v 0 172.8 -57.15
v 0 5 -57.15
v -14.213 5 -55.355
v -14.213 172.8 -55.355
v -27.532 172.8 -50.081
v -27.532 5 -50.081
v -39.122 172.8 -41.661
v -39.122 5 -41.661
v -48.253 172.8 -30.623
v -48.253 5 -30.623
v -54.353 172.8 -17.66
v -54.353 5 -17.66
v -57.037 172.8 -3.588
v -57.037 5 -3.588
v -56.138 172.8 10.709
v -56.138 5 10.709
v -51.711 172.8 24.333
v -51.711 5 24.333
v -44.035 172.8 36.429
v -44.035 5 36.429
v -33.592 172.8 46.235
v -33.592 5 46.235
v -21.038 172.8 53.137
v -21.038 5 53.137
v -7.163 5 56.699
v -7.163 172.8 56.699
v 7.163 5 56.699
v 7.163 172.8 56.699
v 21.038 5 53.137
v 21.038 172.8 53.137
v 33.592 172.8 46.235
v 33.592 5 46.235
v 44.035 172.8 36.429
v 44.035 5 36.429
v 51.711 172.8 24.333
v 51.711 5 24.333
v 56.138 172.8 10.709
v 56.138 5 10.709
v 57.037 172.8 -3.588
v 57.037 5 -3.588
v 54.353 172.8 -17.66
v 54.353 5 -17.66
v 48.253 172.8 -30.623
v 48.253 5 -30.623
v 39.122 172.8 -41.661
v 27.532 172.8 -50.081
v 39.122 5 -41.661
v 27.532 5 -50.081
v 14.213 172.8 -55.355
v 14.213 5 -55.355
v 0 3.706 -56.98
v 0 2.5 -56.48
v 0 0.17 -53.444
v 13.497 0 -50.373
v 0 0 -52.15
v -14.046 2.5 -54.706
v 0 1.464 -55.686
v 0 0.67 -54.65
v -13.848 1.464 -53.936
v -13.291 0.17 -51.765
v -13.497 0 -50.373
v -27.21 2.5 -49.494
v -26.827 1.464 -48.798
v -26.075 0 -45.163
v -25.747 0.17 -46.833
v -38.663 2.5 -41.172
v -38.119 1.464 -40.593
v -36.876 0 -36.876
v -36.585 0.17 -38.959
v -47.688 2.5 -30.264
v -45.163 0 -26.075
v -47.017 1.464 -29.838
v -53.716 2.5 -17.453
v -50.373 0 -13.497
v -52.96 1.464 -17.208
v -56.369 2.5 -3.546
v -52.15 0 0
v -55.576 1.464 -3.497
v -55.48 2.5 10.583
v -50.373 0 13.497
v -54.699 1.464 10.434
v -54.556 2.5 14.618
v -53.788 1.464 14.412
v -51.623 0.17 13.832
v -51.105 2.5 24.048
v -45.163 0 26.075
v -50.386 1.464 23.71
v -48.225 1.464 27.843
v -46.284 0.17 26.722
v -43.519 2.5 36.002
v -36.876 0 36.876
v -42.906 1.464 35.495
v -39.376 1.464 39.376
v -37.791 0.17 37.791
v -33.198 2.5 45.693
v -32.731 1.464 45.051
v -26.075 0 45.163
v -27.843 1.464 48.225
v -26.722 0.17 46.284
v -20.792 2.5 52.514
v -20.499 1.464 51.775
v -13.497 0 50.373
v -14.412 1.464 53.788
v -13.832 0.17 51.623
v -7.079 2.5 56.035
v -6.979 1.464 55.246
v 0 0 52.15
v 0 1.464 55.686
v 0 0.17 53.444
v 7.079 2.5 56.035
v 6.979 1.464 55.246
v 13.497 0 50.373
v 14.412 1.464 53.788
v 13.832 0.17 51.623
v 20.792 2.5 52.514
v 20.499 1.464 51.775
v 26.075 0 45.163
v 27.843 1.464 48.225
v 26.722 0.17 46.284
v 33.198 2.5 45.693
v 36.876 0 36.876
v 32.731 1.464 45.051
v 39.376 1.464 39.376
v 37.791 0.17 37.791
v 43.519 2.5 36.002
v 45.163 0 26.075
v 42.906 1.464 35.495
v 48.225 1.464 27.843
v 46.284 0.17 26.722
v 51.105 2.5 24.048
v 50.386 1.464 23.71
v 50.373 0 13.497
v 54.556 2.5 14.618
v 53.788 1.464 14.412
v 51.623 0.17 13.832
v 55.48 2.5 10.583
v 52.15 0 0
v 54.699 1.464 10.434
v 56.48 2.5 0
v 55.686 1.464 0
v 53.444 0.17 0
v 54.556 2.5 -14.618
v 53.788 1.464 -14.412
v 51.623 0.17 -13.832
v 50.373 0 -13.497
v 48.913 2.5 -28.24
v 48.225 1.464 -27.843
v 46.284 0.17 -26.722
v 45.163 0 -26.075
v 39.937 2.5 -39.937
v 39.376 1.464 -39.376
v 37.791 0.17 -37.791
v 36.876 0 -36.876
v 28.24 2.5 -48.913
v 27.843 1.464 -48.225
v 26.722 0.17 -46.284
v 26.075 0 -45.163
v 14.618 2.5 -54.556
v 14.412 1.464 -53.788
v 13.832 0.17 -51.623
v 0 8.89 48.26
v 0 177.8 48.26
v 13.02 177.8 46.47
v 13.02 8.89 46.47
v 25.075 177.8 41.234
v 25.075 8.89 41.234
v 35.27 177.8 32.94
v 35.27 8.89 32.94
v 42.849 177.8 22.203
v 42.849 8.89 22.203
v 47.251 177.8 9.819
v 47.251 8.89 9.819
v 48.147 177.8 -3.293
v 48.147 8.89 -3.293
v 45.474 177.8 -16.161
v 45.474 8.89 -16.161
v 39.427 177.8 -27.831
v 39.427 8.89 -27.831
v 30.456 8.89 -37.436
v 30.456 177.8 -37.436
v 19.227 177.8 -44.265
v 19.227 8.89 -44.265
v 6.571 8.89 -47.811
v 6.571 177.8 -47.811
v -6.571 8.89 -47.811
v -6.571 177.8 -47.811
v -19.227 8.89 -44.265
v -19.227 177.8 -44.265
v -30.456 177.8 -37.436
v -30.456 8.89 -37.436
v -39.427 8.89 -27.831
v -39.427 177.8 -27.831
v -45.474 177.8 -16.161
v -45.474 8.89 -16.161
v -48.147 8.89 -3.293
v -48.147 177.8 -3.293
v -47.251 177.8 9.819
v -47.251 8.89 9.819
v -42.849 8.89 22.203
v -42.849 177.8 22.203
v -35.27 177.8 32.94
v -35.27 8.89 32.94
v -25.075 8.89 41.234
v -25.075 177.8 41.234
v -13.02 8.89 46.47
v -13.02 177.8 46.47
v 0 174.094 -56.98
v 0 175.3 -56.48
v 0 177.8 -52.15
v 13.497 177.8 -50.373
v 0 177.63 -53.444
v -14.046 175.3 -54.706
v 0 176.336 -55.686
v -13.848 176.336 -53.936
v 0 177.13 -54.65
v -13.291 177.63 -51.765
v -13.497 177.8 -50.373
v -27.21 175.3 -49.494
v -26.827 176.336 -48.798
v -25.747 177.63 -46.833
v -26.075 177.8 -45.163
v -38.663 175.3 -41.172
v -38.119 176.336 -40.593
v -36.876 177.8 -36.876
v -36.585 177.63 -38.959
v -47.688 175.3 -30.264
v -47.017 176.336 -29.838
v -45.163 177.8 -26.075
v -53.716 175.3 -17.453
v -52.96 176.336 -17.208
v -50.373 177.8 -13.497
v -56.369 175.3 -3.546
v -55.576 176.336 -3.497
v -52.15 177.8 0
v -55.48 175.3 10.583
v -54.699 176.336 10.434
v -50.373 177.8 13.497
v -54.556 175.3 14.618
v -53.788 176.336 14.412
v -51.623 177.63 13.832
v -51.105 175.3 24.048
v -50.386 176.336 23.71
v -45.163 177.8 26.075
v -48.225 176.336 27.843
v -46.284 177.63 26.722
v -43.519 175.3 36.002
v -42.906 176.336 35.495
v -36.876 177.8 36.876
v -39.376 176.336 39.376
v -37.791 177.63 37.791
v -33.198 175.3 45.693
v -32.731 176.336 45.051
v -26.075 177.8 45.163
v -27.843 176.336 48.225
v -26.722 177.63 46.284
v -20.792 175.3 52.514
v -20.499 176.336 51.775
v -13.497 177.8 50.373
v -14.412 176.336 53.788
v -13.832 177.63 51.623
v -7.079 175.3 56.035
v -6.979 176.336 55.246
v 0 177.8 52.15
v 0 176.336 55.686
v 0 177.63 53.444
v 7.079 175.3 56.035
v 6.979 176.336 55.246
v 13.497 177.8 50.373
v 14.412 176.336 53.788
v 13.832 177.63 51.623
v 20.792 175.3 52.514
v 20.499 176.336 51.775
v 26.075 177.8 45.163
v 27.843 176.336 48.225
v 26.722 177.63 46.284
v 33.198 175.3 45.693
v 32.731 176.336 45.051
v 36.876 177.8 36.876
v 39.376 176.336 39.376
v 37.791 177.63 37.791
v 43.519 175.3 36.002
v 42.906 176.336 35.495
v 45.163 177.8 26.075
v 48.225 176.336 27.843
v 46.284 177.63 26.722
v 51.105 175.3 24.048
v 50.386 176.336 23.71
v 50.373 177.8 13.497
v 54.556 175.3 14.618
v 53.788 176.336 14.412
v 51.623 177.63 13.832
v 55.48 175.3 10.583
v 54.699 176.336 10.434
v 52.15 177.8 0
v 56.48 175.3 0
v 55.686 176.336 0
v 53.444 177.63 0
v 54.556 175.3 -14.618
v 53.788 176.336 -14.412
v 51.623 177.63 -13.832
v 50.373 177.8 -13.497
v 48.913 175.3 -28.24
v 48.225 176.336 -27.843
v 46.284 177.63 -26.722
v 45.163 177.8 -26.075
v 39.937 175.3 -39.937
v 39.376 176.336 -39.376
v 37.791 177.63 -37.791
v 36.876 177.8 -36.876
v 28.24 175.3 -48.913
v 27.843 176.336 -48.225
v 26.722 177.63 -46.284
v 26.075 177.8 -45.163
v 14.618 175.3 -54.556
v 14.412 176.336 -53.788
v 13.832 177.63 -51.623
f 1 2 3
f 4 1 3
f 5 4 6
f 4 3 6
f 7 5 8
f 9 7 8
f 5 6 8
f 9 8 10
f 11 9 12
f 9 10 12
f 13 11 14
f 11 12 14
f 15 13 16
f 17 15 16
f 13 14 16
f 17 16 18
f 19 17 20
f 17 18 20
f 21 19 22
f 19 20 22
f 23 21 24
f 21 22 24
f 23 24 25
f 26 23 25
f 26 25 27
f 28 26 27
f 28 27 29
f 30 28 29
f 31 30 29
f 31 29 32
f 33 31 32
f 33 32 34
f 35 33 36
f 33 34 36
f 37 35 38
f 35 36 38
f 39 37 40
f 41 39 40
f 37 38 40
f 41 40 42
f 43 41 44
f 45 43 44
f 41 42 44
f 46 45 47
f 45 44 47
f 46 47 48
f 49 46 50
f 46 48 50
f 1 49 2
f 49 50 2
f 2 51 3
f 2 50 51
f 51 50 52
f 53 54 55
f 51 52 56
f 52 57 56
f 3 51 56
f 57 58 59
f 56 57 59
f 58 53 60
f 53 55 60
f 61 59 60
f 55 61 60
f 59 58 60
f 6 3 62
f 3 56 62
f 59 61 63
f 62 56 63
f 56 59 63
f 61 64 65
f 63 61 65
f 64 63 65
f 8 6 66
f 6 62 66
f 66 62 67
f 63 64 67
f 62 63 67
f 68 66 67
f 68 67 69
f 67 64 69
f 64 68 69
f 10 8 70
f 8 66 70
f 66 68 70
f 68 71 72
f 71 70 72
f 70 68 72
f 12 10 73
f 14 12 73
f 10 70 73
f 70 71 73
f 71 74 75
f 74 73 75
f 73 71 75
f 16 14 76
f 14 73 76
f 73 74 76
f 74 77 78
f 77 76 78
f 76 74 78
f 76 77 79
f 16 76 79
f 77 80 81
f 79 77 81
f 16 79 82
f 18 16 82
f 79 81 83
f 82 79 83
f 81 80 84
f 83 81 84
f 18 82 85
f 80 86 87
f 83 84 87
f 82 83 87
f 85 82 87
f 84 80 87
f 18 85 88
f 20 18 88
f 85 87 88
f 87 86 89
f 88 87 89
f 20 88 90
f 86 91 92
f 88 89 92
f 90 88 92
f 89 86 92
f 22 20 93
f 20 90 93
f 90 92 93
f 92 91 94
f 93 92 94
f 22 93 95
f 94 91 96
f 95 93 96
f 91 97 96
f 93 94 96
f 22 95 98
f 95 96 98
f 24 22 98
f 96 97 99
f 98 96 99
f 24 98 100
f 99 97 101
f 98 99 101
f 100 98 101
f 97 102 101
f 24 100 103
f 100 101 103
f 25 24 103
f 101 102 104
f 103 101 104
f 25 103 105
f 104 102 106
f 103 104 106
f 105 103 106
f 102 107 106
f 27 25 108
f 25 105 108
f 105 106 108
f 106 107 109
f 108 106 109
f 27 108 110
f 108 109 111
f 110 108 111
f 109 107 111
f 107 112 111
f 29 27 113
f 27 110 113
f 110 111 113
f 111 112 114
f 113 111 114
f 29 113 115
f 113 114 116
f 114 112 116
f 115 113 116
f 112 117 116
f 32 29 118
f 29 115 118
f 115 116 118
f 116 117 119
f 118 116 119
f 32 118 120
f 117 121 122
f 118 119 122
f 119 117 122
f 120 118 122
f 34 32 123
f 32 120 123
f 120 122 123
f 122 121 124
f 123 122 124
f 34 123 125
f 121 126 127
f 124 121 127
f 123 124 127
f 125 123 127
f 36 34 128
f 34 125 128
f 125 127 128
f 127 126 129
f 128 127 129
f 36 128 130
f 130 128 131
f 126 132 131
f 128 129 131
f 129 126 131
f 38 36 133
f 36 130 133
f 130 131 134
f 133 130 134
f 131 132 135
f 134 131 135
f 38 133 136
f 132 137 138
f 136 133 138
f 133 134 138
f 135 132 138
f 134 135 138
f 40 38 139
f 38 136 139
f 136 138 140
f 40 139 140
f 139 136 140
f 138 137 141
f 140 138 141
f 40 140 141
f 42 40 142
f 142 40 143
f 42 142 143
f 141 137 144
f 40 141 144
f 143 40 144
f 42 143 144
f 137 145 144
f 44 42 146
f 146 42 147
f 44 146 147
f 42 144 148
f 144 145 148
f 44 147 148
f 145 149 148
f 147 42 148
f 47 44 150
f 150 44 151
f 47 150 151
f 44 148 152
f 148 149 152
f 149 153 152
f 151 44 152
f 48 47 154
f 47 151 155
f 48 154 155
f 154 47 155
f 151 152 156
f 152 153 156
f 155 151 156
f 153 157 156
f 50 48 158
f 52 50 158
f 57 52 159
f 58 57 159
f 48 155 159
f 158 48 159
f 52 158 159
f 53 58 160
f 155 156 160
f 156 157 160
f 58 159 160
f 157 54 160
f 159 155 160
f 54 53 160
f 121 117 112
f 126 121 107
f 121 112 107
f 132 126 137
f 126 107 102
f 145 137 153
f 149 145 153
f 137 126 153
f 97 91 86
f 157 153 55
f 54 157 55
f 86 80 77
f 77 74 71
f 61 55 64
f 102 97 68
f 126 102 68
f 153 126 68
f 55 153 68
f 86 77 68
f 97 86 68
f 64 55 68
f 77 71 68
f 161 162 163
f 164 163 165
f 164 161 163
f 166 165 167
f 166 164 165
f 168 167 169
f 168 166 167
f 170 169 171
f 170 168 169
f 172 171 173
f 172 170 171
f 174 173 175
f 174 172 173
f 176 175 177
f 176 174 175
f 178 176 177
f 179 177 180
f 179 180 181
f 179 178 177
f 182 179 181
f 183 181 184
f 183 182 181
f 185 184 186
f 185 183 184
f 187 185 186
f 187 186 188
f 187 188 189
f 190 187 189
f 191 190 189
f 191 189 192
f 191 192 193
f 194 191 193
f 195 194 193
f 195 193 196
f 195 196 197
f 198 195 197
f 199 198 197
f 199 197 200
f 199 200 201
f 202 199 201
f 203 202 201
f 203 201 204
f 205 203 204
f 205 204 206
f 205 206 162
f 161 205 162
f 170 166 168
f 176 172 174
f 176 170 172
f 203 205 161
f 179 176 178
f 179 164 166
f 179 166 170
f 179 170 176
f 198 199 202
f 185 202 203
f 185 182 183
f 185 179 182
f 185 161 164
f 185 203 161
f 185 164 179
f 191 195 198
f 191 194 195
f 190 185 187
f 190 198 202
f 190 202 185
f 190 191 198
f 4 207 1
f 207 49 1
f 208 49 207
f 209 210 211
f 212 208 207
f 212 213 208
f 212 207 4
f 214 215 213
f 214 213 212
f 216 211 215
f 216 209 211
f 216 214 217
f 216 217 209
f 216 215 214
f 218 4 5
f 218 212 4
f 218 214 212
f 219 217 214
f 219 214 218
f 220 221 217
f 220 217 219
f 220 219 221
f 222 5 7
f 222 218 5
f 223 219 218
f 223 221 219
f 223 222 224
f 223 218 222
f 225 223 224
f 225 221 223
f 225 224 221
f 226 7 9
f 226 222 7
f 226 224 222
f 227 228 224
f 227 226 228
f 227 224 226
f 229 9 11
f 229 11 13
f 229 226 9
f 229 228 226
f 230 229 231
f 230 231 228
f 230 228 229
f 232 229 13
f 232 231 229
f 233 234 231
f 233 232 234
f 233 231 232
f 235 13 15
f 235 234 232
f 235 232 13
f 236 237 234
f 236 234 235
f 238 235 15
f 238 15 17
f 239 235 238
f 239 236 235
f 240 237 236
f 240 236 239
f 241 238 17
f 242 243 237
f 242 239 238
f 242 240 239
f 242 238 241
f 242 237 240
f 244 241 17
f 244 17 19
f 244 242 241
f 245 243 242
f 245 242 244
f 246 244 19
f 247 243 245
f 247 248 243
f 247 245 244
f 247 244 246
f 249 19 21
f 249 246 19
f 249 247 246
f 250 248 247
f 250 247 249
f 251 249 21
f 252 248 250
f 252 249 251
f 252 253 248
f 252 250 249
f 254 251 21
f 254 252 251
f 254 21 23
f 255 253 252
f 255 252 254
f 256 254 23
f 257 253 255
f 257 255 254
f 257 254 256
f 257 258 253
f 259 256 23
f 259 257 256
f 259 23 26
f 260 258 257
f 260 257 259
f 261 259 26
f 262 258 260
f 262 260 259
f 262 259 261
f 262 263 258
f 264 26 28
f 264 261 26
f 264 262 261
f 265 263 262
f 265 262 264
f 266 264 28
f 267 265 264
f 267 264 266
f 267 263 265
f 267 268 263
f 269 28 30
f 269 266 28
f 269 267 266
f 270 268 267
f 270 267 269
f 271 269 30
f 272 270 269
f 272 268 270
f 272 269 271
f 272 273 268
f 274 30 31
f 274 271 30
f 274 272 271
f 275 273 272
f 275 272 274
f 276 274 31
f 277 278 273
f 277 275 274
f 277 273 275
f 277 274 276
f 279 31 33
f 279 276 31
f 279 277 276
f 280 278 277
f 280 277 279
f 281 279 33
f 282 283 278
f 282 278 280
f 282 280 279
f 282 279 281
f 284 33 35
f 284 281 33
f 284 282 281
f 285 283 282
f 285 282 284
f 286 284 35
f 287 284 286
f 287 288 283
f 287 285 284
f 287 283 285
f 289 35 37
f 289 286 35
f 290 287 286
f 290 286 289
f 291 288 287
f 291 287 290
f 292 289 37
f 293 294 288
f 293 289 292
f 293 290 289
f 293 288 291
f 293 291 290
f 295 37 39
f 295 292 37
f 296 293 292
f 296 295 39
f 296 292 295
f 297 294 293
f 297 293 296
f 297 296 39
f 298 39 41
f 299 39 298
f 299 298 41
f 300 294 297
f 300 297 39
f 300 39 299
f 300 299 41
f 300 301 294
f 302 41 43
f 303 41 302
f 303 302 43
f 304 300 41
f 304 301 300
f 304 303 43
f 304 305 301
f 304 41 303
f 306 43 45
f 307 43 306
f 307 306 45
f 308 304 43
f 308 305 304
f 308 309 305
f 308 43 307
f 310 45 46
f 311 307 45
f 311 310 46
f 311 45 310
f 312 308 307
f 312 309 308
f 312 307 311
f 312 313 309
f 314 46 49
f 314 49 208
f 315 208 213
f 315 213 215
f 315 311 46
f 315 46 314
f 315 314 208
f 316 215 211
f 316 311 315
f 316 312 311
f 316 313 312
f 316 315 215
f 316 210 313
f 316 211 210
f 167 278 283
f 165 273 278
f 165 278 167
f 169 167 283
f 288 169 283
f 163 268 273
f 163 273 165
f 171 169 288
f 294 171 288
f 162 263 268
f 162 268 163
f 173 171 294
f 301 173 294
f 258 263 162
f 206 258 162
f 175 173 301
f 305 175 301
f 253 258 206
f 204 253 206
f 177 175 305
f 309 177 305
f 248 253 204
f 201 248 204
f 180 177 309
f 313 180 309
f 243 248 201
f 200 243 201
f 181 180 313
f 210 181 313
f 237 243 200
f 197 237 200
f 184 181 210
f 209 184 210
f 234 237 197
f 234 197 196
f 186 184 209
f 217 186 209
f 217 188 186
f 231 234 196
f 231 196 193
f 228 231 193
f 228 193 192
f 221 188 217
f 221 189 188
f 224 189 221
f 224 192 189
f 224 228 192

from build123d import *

# Parameters (mm, degrees)
SKETCH1_R           = 57.15
BOSS_EXTRUDE1_DEPTH = 8.89
SKETCH1_4_R         = 57.15
SKETCH1_4_R_2       = 48.26
BOSS_EXTRUDE2_DEPTH = 177.8
FILLET1_R           = 5


with BuildPart() as part:
    # Sketch1 → Boss-Extrude1 (new body)
    with BuildSketch(Plane(origin=(0, 0, 0), x_dir=(1, 0, 0), z_dir=(0, 1, 0))):
        Circle(SKETCH1_R)
    extrude(amount=BOSS_EXTRUDE1_DEPTH)

    # Sketch1<4> → Boss-Extrude2 (add)
    with BuildSketch(Plane(origin=(0, 0, 0), x_dir=(1, 0, 0), z_dir=(0, 1, 0))):
        Circle(SKETCH1_4_R)
        Circle(SKETCH1_4_R_2, mode=Mode.SUBTRACT)
    extrude(amount=BOSS_EXTRUDE2_DEPTH)

    # Fillet1
    fillet1_edges = [part.edges().sort_by_distance(p)[0] for p in [
        (-57.15, 0, 0),
        (-57.15, 177.8, 0),
    ]]
    fillet(fillet1_edges, radius=FILLET1_R)


solid = part.part
